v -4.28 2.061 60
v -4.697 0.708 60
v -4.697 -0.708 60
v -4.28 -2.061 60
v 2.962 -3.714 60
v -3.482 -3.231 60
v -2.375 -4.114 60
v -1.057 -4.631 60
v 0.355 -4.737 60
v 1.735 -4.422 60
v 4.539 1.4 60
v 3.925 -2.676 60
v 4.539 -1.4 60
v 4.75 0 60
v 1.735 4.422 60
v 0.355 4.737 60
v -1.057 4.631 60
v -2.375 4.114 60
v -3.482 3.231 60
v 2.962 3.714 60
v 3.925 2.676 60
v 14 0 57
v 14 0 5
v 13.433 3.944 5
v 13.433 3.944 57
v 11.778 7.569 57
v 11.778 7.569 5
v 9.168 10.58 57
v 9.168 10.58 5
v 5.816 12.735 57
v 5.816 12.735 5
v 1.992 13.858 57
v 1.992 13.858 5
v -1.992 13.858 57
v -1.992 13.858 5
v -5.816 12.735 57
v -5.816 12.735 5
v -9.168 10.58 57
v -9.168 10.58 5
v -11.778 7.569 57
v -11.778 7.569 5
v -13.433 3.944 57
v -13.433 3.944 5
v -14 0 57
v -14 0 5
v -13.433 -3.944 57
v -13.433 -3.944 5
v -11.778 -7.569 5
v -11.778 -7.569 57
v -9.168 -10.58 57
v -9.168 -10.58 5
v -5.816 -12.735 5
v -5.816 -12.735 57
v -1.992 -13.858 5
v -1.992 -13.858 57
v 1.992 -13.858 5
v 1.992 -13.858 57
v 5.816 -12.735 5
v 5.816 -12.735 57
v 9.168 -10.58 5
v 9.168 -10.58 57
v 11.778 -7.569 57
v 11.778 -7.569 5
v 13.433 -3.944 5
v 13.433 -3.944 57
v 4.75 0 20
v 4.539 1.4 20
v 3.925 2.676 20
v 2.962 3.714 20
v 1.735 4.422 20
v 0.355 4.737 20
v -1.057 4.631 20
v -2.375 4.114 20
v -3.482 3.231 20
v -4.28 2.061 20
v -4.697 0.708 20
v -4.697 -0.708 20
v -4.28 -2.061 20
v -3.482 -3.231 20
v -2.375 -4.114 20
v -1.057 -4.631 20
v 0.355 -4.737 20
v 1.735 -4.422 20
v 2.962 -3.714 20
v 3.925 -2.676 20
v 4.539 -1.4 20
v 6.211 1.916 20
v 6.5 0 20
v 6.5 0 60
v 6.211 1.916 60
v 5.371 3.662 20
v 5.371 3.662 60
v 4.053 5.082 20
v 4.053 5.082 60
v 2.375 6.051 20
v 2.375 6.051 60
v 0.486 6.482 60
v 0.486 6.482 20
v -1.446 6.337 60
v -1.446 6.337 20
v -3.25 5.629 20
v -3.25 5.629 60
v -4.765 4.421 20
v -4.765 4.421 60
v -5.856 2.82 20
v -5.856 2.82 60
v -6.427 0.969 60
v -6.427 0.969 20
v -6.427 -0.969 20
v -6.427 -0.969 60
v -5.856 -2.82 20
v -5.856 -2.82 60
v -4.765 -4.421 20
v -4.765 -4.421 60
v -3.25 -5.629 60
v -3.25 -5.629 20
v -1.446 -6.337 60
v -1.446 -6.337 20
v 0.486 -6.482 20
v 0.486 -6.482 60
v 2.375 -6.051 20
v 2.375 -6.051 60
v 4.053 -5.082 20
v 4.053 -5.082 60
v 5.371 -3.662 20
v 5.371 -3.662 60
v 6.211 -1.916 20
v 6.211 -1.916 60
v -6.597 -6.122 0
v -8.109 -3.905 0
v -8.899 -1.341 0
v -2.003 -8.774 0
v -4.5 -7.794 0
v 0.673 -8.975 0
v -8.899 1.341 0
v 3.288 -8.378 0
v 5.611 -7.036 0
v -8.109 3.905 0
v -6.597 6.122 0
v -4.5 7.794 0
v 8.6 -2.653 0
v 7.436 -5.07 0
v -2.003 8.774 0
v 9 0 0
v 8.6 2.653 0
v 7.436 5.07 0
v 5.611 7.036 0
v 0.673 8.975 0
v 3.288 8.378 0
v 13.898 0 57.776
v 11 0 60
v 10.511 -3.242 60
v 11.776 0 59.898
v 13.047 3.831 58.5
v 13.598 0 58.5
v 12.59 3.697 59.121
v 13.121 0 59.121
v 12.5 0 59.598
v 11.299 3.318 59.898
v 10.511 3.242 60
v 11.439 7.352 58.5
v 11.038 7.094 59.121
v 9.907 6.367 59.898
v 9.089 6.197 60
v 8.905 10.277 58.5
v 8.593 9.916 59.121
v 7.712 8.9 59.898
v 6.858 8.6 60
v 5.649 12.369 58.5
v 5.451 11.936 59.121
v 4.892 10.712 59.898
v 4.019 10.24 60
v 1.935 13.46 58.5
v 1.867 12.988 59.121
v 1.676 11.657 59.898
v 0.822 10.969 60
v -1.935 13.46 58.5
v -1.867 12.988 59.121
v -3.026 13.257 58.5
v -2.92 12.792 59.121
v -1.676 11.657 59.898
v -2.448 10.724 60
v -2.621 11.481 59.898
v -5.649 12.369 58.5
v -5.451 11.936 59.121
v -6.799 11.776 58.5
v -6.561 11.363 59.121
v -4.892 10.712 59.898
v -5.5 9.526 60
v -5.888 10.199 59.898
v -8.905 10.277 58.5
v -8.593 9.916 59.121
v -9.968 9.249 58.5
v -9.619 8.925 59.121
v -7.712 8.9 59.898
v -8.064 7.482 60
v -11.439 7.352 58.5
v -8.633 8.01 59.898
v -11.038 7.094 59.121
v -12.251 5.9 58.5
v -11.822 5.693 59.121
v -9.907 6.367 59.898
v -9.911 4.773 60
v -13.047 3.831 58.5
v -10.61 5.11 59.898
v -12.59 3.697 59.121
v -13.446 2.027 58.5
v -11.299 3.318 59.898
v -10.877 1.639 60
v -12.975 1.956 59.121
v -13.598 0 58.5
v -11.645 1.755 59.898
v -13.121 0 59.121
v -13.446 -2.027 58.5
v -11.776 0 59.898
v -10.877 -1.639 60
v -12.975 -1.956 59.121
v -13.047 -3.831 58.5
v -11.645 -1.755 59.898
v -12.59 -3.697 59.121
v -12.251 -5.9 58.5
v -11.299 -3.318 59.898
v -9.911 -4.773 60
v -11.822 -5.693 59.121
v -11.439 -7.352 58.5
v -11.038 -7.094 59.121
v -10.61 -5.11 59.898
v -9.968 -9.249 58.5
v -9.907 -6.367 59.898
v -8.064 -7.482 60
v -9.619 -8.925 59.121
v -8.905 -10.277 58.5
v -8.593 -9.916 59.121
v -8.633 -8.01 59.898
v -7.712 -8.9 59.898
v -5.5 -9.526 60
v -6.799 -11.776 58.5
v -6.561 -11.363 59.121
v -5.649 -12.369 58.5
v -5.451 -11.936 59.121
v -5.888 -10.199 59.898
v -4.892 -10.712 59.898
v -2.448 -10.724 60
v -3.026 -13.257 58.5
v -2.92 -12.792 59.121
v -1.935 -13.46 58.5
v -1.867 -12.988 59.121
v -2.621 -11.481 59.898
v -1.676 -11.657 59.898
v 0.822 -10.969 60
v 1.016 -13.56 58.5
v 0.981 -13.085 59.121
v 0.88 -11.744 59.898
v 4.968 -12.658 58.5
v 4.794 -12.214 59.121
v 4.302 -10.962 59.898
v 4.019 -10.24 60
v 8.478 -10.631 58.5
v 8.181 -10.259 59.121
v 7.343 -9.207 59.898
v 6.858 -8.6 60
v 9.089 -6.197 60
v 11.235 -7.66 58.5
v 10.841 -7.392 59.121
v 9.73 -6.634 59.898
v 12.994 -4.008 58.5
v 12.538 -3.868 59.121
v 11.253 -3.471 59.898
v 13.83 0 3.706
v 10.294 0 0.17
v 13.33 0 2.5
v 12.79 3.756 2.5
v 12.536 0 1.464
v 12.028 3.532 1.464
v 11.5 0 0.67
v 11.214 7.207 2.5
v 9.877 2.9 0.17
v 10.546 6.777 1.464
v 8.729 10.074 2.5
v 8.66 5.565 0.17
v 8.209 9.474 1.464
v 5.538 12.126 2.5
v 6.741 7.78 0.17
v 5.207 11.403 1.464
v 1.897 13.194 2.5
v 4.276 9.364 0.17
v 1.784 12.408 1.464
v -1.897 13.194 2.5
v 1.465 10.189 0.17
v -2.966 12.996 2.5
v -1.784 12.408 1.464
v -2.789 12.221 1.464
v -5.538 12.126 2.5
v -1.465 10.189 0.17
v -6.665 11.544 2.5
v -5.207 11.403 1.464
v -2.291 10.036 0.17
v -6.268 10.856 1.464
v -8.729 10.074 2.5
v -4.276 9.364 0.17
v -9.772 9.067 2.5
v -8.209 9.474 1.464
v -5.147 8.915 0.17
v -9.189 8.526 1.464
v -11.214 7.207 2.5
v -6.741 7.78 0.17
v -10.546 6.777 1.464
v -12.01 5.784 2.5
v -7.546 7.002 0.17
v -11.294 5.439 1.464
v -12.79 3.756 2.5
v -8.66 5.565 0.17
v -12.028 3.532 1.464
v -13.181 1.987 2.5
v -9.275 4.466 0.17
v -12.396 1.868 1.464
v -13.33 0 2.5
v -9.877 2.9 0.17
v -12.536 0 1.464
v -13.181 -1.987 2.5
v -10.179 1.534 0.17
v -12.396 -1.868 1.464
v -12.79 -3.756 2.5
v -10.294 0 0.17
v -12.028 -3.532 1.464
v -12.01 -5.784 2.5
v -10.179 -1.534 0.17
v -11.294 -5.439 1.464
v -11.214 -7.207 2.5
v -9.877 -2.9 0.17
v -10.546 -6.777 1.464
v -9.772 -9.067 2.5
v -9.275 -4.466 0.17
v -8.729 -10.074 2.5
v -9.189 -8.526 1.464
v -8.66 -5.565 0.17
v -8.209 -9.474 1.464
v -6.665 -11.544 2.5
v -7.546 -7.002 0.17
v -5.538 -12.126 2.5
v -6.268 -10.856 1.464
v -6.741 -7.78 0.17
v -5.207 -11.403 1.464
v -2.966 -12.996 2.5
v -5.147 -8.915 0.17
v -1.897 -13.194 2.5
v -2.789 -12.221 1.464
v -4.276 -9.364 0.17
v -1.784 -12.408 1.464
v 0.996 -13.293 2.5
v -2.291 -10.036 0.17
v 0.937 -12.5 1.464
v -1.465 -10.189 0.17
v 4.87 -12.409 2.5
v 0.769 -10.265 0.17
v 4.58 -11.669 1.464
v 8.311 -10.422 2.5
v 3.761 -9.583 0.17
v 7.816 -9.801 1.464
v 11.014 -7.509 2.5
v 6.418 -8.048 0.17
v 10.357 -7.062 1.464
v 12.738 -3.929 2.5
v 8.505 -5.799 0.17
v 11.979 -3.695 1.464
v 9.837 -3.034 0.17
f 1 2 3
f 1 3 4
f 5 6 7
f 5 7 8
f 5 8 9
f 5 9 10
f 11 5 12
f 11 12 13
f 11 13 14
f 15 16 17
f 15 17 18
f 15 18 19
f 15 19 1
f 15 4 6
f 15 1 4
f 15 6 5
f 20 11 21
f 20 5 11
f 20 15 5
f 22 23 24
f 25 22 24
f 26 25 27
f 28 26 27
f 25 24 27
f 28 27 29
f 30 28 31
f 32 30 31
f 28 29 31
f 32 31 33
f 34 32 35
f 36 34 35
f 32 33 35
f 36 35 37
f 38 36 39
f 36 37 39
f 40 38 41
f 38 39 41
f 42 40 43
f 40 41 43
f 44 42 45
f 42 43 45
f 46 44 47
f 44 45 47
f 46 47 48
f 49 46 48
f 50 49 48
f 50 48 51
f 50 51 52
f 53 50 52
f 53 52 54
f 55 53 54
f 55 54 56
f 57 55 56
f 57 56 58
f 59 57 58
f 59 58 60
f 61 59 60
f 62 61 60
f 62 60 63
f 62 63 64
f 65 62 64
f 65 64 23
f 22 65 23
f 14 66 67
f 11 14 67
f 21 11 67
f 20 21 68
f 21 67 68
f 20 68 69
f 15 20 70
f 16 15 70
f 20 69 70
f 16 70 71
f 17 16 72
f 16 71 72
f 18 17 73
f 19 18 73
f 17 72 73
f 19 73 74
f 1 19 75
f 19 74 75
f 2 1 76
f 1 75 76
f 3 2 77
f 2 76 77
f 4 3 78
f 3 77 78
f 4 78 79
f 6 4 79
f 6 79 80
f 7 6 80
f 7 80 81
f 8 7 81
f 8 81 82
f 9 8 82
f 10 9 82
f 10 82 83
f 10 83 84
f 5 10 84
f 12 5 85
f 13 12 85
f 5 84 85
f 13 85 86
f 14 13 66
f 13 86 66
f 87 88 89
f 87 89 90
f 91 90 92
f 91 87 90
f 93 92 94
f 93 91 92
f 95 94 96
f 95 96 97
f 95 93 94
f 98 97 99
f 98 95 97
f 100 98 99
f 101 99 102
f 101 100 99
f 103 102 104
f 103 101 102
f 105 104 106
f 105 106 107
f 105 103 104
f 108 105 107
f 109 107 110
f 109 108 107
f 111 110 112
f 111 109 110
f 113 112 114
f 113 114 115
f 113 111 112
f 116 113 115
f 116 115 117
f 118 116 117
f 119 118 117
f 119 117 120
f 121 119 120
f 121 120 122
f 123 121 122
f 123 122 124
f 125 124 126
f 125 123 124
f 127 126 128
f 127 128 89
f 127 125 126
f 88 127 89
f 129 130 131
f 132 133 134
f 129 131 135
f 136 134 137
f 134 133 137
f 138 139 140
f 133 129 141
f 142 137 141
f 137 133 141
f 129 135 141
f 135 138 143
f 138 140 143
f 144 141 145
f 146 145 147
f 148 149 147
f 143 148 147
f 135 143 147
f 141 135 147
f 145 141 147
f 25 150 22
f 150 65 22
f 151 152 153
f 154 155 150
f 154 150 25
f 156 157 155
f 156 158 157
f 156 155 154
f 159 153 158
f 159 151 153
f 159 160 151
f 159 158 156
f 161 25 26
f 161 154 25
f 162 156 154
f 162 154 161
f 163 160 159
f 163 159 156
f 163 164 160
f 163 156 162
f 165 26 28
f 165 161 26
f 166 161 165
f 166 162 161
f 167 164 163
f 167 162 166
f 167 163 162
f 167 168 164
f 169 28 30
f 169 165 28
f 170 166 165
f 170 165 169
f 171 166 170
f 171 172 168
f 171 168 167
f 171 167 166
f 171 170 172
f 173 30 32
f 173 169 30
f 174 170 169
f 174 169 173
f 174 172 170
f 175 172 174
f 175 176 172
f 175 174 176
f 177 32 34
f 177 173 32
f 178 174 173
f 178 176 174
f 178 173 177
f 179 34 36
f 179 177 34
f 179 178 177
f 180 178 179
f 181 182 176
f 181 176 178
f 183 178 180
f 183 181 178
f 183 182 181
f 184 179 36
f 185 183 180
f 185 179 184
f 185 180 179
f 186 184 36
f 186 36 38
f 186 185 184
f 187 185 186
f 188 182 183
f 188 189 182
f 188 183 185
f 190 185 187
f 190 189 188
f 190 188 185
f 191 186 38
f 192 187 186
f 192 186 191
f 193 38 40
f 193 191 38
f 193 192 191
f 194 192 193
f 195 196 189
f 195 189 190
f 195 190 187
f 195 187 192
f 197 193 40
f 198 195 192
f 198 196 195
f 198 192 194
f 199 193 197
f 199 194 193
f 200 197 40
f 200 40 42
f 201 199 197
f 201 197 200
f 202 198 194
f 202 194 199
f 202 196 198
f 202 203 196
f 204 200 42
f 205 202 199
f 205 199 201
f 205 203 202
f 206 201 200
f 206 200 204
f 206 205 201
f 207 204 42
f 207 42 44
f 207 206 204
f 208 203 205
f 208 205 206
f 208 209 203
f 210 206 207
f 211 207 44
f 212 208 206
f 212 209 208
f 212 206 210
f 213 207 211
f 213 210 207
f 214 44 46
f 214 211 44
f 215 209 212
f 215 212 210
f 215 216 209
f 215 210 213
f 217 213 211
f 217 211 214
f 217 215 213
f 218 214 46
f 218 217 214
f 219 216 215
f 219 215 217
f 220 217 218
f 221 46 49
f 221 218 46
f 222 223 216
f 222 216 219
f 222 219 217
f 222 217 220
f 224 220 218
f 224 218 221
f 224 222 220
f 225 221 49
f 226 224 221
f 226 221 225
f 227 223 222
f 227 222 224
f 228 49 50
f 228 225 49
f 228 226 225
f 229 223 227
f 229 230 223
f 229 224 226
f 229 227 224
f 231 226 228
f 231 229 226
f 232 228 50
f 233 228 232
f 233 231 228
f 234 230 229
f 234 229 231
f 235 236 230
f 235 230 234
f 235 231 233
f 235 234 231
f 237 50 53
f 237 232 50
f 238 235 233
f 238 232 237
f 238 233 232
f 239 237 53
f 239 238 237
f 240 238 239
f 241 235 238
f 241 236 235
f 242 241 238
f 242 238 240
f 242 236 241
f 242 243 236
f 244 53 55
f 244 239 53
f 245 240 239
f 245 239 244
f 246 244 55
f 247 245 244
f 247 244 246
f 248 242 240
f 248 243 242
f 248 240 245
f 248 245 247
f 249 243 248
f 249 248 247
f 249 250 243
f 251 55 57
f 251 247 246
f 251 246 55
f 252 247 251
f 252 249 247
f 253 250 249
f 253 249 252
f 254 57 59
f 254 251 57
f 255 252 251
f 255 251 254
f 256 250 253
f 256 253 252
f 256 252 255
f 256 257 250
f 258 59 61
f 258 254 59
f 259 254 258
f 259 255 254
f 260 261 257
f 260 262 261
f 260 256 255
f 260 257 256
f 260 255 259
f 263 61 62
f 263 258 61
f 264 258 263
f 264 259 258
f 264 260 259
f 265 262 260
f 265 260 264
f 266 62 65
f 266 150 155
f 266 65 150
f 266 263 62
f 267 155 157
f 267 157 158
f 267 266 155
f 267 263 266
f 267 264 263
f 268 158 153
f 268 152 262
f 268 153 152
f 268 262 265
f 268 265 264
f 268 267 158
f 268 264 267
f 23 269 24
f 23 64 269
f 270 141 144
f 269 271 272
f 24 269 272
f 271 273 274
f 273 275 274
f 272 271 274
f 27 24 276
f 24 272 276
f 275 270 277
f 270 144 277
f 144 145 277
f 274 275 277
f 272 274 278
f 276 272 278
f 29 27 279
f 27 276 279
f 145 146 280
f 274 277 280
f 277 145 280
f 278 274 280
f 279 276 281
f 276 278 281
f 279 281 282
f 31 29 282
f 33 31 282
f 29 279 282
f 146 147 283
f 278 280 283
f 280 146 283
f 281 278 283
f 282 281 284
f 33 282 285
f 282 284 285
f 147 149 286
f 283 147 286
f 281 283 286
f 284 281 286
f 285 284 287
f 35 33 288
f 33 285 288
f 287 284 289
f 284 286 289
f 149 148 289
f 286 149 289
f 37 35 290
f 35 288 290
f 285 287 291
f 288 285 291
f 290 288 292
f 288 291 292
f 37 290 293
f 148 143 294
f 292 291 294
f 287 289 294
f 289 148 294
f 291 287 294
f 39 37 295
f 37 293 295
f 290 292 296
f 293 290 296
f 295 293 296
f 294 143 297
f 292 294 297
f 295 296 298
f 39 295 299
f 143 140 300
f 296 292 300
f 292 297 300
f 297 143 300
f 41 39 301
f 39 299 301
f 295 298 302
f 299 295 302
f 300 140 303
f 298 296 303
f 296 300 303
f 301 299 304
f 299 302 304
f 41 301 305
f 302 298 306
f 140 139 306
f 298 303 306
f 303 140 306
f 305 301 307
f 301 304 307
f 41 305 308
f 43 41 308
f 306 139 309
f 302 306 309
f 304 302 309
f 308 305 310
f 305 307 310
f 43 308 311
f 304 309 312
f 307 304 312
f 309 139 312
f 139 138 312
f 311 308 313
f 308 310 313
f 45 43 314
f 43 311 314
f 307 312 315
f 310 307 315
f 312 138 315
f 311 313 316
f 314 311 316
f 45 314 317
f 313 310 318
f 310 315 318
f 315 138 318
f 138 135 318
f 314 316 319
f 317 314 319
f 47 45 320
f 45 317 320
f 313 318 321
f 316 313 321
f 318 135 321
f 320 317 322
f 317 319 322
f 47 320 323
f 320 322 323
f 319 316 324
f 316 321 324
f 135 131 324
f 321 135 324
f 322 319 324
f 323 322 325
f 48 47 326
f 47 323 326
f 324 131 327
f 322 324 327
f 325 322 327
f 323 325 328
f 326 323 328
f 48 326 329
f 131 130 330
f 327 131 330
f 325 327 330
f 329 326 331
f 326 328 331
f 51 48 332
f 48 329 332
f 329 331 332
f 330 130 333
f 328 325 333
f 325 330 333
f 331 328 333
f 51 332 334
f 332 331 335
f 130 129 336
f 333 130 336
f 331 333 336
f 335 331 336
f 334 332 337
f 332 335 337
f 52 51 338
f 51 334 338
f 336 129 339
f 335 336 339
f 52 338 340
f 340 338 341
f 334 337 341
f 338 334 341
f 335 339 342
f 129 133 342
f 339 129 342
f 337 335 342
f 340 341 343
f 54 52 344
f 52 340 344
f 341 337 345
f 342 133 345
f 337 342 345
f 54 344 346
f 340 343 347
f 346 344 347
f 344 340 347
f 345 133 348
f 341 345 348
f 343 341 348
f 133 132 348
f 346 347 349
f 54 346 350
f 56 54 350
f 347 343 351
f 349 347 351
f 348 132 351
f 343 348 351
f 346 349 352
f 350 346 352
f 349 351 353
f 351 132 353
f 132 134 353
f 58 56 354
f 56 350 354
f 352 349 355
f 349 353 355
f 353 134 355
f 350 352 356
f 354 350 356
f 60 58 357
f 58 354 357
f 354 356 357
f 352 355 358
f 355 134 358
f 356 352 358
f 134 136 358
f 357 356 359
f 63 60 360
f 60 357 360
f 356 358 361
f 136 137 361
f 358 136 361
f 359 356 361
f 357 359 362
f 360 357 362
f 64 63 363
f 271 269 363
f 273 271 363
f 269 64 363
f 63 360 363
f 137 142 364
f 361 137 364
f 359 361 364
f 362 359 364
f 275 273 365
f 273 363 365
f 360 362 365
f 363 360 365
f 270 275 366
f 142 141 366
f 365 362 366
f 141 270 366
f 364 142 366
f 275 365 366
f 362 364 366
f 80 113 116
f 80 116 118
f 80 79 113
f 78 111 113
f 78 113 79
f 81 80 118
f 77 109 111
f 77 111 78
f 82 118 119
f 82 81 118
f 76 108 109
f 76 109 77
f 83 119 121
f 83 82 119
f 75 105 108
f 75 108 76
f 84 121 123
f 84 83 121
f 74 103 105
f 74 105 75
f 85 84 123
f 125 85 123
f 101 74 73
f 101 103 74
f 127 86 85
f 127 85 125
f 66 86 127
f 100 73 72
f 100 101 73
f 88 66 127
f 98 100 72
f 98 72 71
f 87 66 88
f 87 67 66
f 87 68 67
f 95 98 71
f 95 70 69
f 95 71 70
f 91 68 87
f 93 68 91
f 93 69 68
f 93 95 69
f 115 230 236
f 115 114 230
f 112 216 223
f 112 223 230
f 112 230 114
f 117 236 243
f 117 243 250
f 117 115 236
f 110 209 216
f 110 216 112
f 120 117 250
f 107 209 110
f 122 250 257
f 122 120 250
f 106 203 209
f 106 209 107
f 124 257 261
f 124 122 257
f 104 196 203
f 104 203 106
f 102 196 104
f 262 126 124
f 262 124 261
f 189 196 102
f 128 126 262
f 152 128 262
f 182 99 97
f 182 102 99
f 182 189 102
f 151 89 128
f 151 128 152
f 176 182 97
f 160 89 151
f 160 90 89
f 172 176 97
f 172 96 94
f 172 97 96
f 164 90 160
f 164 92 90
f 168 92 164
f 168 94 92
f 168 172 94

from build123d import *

# Parameters (mm, degrees)
F0_R     = 14
F0_R_2   = 9
F0_R_3   = 7.5
F1_DEPTH = 20
F2_R     = 14
F2_R_2   = 6.5
F2_R_3   = 4.75
F3_DEPTH = 40
F4_R     = 5
F5_R     = 3


with BuildPart() as f1:
    # F0 (on Top) → F1 (new body)
    with BuildSketch(Plane.XY):
        Circle(F0_R)
        Circle(F0_R_2, mode=Mode.SUBTRACT)
        Circle(F0_R_2)
        Circle(F0_R_3, mode=Mode.SUBTRACT)
        Circle(F0_R_3)
    extrude(amount=F1_DEPTH)

    # F2 (on face) → F3 (join)
    with BuildSketch(Plane.XY.offset(20)):
        Circle(F2_R)
        Circle(F2_R_2, mode=Mode.SUBTRACT)
        Circle(F2_R_3)
    extrude(amount=F3_DEPTH)

    # F4
    f4_edges = [f1.edges().sort_by_distance(p)[0] for p in [
        (-14, 0, 0),
    ]]
    fillet(f4_edges, radius=F4_R)

    # F5
    f5_edges = [f1.edges().sort_by_distance(p)[0] for p in [
        (-14, 0, 60),
    ]]
    fillet(f5_edges, radius=F5_R)


solid = f1.part
